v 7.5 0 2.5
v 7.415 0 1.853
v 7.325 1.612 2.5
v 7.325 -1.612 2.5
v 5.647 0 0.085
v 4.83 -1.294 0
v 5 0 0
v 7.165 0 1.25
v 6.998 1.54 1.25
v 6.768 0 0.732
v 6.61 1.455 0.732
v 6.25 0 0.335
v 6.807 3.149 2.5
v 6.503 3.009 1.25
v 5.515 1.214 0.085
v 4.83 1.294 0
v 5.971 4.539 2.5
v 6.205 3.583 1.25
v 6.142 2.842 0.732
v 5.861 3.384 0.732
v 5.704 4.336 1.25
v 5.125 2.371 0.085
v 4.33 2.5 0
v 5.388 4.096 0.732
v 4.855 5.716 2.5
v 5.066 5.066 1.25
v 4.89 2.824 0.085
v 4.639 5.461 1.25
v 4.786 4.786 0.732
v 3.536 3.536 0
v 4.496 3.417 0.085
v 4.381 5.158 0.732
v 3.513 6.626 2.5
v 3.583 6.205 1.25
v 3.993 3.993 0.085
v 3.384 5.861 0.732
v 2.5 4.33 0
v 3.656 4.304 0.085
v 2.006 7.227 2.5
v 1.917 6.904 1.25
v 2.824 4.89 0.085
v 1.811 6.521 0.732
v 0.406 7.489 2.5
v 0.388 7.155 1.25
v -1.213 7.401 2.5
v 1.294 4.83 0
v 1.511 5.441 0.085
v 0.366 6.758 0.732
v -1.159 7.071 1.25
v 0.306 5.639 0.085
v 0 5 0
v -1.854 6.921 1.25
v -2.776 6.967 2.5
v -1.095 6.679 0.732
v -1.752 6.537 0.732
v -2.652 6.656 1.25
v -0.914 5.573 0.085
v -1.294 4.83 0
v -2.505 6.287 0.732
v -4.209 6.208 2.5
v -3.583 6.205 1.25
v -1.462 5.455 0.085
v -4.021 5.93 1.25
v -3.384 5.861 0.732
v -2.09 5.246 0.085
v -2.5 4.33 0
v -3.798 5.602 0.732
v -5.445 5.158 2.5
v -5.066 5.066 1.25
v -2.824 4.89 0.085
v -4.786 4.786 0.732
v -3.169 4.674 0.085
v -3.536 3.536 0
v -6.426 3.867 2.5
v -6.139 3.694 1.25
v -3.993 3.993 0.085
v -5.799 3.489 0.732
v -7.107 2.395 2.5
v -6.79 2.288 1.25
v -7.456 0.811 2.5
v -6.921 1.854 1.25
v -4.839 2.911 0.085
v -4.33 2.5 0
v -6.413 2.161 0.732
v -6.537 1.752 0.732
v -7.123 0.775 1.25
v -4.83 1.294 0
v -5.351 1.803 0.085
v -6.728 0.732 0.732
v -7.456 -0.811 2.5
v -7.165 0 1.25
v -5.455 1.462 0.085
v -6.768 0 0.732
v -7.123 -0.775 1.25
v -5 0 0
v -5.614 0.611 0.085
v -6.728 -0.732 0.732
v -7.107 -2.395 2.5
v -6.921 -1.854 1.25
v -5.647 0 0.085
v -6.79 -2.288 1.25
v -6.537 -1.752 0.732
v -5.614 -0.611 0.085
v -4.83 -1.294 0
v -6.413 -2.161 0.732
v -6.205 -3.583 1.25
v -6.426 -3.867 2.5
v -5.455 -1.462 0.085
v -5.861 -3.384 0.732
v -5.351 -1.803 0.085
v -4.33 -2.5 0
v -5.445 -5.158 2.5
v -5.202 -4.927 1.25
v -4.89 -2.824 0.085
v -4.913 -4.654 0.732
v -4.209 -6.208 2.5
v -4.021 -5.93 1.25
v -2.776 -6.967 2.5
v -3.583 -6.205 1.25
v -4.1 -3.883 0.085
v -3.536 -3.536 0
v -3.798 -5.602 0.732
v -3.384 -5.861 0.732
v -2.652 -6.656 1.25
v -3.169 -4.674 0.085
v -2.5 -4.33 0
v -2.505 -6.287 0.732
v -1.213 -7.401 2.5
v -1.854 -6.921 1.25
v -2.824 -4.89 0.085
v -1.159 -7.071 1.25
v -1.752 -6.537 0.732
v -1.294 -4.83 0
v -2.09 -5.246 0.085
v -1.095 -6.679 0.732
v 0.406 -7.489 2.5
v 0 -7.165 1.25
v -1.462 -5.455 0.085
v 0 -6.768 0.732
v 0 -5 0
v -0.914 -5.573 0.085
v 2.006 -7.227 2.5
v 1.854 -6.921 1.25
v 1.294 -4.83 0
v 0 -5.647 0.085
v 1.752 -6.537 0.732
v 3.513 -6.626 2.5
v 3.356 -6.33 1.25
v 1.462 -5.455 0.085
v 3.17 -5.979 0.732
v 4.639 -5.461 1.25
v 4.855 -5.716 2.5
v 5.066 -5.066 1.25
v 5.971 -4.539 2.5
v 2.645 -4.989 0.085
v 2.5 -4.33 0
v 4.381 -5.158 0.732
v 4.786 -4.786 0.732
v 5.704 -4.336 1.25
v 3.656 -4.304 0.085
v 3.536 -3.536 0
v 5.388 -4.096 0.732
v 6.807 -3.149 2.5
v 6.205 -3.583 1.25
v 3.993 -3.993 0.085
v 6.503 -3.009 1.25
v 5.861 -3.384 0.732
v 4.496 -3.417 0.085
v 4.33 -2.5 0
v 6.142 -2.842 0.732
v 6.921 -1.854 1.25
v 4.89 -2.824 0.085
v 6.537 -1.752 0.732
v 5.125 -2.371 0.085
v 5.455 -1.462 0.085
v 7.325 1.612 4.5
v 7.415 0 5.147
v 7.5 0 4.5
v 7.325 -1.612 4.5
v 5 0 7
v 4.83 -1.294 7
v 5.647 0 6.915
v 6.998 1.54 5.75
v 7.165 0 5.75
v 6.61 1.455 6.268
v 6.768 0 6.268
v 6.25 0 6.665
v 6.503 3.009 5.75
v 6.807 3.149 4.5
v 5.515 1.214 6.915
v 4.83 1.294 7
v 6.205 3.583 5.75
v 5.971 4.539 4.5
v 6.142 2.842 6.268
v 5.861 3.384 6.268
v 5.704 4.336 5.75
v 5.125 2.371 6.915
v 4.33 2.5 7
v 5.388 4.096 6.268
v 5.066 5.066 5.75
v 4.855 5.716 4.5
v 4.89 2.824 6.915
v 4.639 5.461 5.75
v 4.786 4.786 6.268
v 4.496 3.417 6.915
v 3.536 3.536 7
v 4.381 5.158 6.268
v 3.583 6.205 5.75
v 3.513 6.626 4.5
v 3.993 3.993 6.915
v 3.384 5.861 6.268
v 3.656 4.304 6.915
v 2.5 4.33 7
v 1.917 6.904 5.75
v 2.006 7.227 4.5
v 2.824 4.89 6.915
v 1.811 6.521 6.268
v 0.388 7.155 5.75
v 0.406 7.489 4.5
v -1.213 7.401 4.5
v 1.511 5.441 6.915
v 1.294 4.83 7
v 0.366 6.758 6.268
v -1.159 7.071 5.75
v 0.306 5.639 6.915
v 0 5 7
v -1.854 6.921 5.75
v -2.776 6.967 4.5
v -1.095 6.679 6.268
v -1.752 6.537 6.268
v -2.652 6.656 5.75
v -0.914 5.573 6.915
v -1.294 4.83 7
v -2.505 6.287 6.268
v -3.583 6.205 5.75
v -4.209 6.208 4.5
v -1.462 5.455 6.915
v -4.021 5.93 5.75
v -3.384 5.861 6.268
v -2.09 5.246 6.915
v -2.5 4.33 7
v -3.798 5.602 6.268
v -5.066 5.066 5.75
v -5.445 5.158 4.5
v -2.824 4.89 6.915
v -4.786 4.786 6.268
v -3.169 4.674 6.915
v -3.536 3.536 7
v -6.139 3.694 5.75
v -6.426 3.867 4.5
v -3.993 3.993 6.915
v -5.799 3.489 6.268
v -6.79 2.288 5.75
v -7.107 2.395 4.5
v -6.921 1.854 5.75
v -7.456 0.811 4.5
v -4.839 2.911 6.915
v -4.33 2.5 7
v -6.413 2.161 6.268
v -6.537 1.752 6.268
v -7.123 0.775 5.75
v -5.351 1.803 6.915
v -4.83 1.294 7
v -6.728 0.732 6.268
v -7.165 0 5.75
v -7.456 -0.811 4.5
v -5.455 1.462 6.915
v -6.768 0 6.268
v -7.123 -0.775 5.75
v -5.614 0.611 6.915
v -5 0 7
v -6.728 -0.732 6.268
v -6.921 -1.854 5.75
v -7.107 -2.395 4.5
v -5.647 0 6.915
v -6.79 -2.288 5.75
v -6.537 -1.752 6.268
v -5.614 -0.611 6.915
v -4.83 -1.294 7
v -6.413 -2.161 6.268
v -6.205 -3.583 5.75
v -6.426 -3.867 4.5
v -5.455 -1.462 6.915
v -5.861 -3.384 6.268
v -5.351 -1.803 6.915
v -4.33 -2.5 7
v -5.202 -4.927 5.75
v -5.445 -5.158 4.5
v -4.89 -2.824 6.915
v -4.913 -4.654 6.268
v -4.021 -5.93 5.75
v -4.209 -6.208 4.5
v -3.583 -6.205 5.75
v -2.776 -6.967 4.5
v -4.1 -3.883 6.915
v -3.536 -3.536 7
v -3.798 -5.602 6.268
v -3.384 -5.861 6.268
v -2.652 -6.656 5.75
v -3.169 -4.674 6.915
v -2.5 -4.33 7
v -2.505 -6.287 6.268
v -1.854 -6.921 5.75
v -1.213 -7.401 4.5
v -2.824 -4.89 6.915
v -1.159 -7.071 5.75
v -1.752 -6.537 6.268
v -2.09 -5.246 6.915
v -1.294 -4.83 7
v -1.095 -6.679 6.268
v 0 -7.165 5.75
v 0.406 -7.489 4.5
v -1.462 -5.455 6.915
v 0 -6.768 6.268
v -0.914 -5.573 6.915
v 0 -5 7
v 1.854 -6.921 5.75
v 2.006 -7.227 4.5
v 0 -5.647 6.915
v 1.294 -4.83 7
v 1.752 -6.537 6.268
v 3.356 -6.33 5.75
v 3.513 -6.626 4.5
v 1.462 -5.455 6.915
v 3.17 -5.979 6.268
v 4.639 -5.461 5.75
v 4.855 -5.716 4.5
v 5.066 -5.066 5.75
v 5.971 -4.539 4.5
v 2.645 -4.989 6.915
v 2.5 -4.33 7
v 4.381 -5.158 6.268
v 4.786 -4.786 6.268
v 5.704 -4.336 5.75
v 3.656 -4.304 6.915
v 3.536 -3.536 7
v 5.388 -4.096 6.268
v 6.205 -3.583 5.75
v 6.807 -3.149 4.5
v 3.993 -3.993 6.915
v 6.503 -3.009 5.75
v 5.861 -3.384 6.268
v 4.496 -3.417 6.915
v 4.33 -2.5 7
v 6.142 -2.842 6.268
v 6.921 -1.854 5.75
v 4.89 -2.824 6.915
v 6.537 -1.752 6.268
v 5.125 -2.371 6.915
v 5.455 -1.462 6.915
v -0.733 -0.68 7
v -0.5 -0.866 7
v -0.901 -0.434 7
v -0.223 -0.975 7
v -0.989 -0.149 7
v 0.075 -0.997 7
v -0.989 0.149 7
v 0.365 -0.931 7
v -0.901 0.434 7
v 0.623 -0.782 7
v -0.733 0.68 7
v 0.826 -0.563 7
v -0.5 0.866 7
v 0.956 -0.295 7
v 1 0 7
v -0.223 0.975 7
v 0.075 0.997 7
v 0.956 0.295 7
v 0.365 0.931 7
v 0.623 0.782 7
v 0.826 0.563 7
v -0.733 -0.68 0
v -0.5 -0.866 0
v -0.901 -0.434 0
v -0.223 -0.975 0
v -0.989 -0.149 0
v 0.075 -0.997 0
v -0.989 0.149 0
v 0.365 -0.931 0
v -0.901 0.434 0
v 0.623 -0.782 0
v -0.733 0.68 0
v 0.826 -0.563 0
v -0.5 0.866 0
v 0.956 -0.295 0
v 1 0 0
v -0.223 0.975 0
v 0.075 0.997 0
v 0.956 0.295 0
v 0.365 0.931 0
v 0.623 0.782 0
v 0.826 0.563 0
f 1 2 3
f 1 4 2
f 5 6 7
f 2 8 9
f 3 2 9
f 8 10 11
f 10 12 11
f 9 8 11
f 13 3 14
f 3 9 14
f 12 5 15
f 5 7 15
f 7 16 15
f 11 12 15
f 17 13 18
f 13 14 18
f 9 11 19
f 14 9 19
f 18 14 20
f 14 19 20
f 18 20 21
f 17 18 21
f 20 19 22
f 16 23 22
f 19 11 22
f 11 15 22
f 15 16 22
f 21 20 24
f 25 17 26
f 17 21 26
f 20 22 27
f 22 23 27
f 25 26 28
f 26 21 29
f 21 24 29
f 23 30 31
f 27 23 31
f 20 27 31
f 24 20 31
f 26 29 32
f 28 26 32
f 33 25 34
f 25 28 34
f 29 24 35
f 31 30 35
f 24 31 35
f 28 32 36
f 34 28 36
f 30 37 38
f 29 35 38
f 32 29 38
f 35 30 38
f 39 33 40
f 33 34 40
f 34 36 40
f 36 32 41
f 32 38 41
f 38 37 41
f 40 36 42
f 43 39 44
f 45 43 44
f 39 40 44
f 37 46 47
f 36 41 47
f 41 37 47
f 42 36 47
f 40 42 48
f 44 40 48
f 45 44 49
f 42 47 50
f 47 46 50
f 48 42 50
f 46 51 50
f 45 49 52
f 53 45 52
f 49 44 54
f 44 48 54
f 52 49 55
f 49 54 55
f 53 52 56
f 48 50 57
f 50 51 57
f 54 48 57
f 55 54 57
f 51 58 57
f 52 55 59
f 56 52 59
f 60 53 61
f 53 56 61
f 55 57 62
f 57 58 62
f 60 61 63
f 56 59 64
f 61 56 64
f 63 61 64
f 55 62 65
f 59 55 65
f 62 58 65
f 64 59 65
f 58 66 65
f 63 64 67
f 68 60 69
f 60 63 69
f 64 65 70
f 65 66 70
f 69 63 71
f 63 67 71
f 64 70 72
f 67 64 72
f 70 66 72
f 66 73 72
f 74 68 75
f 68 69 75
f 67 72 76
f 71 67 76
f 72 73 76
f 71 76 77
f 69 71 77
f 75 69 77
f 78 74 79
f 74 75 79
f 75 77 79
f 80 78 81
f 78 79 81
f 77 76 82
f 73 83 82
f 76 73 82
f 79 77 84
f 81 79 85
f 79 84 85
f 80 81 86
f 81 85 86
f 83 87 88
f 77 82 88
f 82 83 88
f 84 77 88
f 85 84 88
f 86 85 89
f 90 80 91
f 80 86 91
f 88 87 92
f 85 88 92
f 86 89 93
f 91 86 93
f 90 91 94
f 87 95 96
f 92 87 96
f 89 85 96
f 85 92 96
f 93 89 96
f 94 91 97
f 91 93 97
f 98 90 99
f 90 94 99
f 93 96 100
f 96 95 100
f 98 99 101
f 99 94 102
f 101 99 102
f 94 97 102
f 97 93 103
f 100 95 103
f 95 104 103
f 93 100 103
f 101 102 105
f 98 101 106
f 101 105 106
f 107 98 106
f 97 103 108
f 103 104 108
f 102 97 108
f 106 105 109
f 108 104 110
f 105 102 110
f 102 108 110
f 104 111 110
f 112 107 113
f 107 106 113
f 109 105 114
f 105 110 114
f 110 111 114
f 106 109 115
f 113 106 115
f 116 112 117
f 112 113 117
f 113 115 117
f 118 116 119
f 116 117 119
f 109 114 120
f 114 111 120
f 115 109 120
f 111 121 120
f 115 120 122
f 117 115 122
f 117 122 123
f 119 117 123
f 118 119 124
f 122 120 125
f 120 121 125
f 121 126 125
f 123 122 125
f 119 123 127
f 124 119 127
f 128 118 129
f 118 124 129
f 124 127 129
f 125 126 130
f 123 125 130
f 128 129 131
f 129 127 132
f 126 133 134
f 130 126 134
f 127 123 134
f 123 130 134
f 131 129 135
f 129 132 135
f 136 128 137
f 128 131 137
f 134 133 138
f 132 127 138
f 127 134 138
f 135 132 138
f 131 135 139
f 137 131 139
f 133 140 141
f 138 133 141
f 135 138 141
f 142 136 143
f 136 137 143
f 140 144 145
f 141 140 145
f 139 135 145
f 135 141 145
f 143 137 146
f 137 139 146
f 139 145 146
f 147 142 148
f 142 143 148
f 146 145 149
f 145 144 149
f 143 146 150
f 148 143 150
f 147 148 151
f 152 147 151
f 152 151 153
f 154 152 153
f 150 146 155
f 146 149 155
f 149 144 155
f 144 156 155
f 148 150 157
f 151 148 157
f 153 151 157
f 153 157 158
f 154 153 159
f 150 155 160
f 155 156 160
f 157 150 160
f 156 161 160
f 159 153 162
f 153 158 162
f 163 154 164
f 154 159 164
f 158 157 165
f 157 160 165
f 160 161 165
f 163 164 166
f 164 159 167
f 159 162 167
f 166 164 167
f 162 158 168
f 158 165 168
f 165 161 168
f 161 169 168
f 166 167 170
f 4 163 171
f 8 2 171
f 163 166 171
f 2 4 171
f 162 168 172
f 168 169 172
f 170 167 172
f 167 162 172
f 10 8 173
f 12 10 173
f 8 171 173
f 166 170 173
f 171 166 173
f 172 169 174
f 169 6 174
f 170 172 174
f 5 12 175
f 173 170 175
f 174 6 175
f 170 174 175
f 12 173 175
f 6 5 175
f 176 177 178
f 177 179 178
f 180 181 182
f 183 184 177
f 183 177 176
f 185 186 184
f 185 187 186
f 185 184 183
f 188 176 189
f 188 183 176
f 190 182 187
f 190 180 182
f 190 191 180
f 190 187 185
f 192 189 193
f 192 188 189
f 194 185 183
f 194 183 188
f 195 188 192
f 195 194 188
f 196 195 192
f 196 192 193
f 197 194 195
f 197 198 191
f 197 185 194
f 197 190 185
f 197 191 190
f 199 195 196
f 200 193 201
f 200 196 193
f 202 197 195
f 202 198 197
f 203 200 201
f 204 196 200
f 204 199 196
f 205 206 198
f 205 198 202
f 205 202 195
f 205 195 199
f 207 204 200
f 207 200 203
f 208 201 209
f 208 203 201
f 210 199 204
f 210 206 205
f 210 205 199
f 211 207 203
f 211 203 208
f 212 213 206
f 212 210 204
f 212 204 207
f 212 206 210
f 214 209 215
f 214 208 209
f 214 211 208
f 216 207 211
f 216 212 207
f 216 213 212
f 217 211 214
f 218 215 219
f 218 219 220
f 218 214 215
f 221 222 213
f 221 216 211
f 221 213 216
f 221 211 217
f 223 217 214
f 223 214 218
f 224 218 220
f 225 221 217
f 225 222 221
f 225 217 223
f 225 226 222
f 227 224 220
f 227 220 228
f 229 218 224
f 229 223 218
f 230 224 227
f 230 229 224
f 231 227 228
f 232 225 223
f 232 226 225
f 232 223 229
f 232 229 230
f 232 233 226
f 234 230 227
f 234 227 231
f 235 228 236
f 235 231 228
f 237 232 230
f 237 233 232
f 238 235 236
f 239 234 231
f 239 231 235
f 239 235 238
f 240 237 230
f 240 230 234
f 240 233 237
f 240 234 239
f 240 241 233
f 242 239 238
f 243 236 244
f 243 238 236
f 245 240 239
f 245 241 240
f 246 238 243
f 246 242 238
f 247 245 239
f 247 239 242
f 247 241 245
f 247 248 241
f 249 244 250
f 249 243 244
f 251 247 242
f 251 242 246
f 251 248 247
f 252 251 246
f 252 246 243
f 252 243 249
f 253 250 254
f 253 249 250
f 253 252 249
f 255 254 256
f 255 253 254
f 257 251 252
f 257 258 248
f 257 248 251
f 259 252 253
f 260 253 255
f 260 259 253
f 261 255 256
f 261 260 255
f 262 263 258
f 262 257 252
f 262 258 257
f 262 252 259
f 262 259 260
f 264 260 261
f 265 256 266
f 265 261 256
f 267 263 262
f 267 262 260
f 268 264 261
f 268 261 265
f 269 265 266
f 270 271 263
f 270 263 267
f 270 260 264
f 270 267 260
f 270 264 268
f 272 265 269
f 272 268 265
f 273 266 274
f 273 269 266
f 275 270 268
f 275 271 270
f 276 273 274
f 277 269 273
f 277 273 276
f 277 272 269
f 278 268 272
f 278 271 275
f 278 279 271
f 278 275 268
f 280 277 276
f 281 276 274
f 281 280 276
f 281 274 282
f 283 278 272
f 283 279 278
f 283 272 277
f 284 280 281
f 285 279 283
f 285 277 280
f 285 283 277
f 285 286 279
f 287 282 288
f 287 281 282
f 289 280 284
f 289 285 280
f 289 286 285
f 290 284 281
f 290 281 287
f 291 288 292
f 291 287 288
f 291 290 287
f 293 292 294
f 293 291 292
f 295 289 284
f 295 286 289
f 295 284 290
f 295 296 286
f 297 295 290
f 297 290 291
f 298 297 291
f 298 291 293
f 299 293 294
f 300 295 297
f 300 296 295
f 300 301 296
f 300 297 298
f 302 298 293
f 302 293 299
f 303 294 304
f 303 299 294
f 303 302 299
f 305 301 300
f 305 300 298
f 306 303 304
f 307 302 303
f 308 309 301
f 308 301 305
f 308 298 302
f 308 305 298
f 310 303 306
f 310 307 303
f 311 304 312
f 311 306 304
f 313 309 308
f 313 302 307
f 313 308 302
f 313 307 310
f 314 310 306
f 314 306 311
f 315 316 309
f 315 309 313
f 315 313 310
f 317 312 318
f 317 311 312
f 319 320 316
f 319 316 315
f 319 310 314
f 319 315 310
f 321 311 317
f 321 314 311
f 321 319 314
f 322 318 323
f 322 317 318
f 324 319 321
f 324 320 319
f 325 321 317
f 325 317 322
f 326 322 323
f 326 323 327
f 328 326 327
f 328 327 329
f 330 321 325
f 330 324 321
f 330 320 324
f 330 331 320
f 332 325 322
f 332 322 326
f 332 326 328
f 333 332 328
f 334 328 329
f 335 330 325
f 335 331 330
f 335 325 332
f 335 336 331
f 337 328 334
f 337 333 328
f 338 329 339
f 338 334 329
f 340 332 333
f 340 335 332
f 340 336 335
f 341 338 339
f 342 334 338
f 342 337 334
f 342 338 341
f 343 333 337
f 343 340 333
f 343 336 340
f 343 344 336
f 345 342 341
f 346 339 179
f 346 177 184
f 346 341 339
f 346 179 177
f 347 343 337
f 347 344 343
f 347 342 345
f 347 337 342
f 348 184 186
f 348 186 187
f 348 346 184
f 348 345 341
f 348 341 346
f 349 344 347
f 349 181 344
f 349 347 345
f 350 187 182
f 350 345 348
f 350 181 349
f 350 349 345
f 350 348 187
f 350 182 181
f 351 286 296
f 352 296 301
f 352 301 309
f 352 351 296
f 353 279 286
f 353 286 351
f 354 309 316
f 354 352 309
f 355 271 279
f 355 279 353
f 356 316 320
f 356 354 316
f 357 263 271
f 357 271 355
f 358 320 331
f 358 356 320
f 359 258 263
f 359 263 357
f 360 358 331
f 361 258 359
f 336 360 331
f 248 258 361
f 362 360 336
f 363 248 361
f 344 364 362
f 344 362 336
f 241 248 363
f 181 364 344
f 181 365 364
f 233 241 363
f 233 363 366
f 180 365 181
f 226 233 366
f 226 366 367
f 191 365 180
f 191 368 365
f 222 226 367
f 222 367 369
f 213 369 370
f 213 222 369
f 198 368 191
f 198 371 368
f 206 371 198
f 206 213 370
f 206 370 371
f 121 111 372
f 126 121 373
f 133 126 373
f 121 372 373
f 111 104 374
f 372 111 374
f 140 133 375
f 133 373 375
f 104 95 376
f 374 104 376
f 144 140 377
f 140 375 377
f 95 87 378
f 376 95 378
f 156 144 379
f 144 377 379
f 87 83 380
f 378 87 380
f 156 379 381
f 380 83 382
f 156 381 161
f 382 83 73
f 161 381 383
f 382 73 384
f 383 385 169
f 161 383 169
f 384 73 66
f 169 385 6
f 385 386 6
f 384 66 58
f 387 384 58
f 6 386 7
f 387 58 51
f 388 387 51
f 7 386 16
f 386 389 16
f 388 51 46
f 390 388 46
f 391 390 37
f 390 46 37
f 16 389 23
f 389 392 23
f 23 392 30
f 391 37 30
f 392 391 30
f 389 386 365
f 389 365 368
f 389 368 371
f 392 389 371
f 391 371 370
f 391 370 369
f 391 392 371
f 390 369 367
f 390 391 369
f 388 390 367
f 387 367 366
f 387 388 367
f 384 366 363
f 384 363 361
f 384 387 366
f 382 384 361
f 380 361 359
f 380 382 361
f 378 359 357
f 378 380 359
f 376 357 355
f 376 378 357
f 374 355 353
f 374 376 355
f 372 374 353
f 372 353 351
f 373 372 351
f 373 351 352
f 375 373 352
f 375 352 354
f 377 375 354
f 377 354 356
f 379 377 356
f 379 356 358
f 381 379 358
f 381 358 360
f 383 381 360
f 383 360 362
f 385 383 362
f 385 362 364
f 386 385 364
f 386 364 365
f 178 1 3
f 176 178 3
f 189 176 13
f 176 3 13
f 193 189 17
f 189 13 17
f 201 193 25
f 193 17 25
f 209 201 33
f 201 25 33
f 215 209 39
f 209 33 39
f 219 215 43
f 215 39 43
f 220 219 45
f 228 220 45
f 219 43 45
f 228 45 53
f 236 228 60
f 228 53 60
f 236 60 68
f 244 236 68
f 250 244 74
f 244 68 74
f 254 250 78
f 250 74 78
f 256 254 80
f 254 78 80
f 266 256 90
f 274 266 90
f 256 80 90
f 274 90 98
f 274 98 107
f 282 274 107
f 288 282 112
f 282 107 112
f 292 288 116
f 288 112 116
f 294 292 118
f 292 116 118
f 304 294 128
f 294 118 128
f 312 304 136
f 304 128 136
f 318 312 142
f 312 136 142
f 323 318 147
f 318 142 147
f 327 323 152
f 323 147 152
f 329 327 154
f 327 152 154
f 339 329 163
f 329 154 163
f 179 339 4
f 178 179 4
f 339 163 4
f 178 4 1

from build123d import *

# Parameters (mm, degrees)
F0_R     = 7.5
F0_R_2   = 1
F1_DEPTH = 7
F2_DEPTH = 5
F3_R     = 2.5


with BuildPart() as f1:
    # F0 (on Top) → F1 (new body)
    with BuildSketch(Plane.XY):
        Circle(F0_R)
        Circle(F0_R_2, mode=Mode.SUBTRACT)
    extrude(amount=F1_DEPTH)

    # F0 (on Top) → F2 (join)
    with BuildSketch(Plane.XY):
        Circle(F0_R)
        Circle(F0_R_2, mode=Mode.SUBTRACT)
    extrude(amount=F2_DEPTH)

    # F3
    f3_edges = [f1.edges().sort_by_distance(p)[0] for p in [
        (-7.5, 0, 7),
        (-7.5, 0, 0),
    ]]
    fillet(f3_edges, radius=F3_R)


solid = f1.part
